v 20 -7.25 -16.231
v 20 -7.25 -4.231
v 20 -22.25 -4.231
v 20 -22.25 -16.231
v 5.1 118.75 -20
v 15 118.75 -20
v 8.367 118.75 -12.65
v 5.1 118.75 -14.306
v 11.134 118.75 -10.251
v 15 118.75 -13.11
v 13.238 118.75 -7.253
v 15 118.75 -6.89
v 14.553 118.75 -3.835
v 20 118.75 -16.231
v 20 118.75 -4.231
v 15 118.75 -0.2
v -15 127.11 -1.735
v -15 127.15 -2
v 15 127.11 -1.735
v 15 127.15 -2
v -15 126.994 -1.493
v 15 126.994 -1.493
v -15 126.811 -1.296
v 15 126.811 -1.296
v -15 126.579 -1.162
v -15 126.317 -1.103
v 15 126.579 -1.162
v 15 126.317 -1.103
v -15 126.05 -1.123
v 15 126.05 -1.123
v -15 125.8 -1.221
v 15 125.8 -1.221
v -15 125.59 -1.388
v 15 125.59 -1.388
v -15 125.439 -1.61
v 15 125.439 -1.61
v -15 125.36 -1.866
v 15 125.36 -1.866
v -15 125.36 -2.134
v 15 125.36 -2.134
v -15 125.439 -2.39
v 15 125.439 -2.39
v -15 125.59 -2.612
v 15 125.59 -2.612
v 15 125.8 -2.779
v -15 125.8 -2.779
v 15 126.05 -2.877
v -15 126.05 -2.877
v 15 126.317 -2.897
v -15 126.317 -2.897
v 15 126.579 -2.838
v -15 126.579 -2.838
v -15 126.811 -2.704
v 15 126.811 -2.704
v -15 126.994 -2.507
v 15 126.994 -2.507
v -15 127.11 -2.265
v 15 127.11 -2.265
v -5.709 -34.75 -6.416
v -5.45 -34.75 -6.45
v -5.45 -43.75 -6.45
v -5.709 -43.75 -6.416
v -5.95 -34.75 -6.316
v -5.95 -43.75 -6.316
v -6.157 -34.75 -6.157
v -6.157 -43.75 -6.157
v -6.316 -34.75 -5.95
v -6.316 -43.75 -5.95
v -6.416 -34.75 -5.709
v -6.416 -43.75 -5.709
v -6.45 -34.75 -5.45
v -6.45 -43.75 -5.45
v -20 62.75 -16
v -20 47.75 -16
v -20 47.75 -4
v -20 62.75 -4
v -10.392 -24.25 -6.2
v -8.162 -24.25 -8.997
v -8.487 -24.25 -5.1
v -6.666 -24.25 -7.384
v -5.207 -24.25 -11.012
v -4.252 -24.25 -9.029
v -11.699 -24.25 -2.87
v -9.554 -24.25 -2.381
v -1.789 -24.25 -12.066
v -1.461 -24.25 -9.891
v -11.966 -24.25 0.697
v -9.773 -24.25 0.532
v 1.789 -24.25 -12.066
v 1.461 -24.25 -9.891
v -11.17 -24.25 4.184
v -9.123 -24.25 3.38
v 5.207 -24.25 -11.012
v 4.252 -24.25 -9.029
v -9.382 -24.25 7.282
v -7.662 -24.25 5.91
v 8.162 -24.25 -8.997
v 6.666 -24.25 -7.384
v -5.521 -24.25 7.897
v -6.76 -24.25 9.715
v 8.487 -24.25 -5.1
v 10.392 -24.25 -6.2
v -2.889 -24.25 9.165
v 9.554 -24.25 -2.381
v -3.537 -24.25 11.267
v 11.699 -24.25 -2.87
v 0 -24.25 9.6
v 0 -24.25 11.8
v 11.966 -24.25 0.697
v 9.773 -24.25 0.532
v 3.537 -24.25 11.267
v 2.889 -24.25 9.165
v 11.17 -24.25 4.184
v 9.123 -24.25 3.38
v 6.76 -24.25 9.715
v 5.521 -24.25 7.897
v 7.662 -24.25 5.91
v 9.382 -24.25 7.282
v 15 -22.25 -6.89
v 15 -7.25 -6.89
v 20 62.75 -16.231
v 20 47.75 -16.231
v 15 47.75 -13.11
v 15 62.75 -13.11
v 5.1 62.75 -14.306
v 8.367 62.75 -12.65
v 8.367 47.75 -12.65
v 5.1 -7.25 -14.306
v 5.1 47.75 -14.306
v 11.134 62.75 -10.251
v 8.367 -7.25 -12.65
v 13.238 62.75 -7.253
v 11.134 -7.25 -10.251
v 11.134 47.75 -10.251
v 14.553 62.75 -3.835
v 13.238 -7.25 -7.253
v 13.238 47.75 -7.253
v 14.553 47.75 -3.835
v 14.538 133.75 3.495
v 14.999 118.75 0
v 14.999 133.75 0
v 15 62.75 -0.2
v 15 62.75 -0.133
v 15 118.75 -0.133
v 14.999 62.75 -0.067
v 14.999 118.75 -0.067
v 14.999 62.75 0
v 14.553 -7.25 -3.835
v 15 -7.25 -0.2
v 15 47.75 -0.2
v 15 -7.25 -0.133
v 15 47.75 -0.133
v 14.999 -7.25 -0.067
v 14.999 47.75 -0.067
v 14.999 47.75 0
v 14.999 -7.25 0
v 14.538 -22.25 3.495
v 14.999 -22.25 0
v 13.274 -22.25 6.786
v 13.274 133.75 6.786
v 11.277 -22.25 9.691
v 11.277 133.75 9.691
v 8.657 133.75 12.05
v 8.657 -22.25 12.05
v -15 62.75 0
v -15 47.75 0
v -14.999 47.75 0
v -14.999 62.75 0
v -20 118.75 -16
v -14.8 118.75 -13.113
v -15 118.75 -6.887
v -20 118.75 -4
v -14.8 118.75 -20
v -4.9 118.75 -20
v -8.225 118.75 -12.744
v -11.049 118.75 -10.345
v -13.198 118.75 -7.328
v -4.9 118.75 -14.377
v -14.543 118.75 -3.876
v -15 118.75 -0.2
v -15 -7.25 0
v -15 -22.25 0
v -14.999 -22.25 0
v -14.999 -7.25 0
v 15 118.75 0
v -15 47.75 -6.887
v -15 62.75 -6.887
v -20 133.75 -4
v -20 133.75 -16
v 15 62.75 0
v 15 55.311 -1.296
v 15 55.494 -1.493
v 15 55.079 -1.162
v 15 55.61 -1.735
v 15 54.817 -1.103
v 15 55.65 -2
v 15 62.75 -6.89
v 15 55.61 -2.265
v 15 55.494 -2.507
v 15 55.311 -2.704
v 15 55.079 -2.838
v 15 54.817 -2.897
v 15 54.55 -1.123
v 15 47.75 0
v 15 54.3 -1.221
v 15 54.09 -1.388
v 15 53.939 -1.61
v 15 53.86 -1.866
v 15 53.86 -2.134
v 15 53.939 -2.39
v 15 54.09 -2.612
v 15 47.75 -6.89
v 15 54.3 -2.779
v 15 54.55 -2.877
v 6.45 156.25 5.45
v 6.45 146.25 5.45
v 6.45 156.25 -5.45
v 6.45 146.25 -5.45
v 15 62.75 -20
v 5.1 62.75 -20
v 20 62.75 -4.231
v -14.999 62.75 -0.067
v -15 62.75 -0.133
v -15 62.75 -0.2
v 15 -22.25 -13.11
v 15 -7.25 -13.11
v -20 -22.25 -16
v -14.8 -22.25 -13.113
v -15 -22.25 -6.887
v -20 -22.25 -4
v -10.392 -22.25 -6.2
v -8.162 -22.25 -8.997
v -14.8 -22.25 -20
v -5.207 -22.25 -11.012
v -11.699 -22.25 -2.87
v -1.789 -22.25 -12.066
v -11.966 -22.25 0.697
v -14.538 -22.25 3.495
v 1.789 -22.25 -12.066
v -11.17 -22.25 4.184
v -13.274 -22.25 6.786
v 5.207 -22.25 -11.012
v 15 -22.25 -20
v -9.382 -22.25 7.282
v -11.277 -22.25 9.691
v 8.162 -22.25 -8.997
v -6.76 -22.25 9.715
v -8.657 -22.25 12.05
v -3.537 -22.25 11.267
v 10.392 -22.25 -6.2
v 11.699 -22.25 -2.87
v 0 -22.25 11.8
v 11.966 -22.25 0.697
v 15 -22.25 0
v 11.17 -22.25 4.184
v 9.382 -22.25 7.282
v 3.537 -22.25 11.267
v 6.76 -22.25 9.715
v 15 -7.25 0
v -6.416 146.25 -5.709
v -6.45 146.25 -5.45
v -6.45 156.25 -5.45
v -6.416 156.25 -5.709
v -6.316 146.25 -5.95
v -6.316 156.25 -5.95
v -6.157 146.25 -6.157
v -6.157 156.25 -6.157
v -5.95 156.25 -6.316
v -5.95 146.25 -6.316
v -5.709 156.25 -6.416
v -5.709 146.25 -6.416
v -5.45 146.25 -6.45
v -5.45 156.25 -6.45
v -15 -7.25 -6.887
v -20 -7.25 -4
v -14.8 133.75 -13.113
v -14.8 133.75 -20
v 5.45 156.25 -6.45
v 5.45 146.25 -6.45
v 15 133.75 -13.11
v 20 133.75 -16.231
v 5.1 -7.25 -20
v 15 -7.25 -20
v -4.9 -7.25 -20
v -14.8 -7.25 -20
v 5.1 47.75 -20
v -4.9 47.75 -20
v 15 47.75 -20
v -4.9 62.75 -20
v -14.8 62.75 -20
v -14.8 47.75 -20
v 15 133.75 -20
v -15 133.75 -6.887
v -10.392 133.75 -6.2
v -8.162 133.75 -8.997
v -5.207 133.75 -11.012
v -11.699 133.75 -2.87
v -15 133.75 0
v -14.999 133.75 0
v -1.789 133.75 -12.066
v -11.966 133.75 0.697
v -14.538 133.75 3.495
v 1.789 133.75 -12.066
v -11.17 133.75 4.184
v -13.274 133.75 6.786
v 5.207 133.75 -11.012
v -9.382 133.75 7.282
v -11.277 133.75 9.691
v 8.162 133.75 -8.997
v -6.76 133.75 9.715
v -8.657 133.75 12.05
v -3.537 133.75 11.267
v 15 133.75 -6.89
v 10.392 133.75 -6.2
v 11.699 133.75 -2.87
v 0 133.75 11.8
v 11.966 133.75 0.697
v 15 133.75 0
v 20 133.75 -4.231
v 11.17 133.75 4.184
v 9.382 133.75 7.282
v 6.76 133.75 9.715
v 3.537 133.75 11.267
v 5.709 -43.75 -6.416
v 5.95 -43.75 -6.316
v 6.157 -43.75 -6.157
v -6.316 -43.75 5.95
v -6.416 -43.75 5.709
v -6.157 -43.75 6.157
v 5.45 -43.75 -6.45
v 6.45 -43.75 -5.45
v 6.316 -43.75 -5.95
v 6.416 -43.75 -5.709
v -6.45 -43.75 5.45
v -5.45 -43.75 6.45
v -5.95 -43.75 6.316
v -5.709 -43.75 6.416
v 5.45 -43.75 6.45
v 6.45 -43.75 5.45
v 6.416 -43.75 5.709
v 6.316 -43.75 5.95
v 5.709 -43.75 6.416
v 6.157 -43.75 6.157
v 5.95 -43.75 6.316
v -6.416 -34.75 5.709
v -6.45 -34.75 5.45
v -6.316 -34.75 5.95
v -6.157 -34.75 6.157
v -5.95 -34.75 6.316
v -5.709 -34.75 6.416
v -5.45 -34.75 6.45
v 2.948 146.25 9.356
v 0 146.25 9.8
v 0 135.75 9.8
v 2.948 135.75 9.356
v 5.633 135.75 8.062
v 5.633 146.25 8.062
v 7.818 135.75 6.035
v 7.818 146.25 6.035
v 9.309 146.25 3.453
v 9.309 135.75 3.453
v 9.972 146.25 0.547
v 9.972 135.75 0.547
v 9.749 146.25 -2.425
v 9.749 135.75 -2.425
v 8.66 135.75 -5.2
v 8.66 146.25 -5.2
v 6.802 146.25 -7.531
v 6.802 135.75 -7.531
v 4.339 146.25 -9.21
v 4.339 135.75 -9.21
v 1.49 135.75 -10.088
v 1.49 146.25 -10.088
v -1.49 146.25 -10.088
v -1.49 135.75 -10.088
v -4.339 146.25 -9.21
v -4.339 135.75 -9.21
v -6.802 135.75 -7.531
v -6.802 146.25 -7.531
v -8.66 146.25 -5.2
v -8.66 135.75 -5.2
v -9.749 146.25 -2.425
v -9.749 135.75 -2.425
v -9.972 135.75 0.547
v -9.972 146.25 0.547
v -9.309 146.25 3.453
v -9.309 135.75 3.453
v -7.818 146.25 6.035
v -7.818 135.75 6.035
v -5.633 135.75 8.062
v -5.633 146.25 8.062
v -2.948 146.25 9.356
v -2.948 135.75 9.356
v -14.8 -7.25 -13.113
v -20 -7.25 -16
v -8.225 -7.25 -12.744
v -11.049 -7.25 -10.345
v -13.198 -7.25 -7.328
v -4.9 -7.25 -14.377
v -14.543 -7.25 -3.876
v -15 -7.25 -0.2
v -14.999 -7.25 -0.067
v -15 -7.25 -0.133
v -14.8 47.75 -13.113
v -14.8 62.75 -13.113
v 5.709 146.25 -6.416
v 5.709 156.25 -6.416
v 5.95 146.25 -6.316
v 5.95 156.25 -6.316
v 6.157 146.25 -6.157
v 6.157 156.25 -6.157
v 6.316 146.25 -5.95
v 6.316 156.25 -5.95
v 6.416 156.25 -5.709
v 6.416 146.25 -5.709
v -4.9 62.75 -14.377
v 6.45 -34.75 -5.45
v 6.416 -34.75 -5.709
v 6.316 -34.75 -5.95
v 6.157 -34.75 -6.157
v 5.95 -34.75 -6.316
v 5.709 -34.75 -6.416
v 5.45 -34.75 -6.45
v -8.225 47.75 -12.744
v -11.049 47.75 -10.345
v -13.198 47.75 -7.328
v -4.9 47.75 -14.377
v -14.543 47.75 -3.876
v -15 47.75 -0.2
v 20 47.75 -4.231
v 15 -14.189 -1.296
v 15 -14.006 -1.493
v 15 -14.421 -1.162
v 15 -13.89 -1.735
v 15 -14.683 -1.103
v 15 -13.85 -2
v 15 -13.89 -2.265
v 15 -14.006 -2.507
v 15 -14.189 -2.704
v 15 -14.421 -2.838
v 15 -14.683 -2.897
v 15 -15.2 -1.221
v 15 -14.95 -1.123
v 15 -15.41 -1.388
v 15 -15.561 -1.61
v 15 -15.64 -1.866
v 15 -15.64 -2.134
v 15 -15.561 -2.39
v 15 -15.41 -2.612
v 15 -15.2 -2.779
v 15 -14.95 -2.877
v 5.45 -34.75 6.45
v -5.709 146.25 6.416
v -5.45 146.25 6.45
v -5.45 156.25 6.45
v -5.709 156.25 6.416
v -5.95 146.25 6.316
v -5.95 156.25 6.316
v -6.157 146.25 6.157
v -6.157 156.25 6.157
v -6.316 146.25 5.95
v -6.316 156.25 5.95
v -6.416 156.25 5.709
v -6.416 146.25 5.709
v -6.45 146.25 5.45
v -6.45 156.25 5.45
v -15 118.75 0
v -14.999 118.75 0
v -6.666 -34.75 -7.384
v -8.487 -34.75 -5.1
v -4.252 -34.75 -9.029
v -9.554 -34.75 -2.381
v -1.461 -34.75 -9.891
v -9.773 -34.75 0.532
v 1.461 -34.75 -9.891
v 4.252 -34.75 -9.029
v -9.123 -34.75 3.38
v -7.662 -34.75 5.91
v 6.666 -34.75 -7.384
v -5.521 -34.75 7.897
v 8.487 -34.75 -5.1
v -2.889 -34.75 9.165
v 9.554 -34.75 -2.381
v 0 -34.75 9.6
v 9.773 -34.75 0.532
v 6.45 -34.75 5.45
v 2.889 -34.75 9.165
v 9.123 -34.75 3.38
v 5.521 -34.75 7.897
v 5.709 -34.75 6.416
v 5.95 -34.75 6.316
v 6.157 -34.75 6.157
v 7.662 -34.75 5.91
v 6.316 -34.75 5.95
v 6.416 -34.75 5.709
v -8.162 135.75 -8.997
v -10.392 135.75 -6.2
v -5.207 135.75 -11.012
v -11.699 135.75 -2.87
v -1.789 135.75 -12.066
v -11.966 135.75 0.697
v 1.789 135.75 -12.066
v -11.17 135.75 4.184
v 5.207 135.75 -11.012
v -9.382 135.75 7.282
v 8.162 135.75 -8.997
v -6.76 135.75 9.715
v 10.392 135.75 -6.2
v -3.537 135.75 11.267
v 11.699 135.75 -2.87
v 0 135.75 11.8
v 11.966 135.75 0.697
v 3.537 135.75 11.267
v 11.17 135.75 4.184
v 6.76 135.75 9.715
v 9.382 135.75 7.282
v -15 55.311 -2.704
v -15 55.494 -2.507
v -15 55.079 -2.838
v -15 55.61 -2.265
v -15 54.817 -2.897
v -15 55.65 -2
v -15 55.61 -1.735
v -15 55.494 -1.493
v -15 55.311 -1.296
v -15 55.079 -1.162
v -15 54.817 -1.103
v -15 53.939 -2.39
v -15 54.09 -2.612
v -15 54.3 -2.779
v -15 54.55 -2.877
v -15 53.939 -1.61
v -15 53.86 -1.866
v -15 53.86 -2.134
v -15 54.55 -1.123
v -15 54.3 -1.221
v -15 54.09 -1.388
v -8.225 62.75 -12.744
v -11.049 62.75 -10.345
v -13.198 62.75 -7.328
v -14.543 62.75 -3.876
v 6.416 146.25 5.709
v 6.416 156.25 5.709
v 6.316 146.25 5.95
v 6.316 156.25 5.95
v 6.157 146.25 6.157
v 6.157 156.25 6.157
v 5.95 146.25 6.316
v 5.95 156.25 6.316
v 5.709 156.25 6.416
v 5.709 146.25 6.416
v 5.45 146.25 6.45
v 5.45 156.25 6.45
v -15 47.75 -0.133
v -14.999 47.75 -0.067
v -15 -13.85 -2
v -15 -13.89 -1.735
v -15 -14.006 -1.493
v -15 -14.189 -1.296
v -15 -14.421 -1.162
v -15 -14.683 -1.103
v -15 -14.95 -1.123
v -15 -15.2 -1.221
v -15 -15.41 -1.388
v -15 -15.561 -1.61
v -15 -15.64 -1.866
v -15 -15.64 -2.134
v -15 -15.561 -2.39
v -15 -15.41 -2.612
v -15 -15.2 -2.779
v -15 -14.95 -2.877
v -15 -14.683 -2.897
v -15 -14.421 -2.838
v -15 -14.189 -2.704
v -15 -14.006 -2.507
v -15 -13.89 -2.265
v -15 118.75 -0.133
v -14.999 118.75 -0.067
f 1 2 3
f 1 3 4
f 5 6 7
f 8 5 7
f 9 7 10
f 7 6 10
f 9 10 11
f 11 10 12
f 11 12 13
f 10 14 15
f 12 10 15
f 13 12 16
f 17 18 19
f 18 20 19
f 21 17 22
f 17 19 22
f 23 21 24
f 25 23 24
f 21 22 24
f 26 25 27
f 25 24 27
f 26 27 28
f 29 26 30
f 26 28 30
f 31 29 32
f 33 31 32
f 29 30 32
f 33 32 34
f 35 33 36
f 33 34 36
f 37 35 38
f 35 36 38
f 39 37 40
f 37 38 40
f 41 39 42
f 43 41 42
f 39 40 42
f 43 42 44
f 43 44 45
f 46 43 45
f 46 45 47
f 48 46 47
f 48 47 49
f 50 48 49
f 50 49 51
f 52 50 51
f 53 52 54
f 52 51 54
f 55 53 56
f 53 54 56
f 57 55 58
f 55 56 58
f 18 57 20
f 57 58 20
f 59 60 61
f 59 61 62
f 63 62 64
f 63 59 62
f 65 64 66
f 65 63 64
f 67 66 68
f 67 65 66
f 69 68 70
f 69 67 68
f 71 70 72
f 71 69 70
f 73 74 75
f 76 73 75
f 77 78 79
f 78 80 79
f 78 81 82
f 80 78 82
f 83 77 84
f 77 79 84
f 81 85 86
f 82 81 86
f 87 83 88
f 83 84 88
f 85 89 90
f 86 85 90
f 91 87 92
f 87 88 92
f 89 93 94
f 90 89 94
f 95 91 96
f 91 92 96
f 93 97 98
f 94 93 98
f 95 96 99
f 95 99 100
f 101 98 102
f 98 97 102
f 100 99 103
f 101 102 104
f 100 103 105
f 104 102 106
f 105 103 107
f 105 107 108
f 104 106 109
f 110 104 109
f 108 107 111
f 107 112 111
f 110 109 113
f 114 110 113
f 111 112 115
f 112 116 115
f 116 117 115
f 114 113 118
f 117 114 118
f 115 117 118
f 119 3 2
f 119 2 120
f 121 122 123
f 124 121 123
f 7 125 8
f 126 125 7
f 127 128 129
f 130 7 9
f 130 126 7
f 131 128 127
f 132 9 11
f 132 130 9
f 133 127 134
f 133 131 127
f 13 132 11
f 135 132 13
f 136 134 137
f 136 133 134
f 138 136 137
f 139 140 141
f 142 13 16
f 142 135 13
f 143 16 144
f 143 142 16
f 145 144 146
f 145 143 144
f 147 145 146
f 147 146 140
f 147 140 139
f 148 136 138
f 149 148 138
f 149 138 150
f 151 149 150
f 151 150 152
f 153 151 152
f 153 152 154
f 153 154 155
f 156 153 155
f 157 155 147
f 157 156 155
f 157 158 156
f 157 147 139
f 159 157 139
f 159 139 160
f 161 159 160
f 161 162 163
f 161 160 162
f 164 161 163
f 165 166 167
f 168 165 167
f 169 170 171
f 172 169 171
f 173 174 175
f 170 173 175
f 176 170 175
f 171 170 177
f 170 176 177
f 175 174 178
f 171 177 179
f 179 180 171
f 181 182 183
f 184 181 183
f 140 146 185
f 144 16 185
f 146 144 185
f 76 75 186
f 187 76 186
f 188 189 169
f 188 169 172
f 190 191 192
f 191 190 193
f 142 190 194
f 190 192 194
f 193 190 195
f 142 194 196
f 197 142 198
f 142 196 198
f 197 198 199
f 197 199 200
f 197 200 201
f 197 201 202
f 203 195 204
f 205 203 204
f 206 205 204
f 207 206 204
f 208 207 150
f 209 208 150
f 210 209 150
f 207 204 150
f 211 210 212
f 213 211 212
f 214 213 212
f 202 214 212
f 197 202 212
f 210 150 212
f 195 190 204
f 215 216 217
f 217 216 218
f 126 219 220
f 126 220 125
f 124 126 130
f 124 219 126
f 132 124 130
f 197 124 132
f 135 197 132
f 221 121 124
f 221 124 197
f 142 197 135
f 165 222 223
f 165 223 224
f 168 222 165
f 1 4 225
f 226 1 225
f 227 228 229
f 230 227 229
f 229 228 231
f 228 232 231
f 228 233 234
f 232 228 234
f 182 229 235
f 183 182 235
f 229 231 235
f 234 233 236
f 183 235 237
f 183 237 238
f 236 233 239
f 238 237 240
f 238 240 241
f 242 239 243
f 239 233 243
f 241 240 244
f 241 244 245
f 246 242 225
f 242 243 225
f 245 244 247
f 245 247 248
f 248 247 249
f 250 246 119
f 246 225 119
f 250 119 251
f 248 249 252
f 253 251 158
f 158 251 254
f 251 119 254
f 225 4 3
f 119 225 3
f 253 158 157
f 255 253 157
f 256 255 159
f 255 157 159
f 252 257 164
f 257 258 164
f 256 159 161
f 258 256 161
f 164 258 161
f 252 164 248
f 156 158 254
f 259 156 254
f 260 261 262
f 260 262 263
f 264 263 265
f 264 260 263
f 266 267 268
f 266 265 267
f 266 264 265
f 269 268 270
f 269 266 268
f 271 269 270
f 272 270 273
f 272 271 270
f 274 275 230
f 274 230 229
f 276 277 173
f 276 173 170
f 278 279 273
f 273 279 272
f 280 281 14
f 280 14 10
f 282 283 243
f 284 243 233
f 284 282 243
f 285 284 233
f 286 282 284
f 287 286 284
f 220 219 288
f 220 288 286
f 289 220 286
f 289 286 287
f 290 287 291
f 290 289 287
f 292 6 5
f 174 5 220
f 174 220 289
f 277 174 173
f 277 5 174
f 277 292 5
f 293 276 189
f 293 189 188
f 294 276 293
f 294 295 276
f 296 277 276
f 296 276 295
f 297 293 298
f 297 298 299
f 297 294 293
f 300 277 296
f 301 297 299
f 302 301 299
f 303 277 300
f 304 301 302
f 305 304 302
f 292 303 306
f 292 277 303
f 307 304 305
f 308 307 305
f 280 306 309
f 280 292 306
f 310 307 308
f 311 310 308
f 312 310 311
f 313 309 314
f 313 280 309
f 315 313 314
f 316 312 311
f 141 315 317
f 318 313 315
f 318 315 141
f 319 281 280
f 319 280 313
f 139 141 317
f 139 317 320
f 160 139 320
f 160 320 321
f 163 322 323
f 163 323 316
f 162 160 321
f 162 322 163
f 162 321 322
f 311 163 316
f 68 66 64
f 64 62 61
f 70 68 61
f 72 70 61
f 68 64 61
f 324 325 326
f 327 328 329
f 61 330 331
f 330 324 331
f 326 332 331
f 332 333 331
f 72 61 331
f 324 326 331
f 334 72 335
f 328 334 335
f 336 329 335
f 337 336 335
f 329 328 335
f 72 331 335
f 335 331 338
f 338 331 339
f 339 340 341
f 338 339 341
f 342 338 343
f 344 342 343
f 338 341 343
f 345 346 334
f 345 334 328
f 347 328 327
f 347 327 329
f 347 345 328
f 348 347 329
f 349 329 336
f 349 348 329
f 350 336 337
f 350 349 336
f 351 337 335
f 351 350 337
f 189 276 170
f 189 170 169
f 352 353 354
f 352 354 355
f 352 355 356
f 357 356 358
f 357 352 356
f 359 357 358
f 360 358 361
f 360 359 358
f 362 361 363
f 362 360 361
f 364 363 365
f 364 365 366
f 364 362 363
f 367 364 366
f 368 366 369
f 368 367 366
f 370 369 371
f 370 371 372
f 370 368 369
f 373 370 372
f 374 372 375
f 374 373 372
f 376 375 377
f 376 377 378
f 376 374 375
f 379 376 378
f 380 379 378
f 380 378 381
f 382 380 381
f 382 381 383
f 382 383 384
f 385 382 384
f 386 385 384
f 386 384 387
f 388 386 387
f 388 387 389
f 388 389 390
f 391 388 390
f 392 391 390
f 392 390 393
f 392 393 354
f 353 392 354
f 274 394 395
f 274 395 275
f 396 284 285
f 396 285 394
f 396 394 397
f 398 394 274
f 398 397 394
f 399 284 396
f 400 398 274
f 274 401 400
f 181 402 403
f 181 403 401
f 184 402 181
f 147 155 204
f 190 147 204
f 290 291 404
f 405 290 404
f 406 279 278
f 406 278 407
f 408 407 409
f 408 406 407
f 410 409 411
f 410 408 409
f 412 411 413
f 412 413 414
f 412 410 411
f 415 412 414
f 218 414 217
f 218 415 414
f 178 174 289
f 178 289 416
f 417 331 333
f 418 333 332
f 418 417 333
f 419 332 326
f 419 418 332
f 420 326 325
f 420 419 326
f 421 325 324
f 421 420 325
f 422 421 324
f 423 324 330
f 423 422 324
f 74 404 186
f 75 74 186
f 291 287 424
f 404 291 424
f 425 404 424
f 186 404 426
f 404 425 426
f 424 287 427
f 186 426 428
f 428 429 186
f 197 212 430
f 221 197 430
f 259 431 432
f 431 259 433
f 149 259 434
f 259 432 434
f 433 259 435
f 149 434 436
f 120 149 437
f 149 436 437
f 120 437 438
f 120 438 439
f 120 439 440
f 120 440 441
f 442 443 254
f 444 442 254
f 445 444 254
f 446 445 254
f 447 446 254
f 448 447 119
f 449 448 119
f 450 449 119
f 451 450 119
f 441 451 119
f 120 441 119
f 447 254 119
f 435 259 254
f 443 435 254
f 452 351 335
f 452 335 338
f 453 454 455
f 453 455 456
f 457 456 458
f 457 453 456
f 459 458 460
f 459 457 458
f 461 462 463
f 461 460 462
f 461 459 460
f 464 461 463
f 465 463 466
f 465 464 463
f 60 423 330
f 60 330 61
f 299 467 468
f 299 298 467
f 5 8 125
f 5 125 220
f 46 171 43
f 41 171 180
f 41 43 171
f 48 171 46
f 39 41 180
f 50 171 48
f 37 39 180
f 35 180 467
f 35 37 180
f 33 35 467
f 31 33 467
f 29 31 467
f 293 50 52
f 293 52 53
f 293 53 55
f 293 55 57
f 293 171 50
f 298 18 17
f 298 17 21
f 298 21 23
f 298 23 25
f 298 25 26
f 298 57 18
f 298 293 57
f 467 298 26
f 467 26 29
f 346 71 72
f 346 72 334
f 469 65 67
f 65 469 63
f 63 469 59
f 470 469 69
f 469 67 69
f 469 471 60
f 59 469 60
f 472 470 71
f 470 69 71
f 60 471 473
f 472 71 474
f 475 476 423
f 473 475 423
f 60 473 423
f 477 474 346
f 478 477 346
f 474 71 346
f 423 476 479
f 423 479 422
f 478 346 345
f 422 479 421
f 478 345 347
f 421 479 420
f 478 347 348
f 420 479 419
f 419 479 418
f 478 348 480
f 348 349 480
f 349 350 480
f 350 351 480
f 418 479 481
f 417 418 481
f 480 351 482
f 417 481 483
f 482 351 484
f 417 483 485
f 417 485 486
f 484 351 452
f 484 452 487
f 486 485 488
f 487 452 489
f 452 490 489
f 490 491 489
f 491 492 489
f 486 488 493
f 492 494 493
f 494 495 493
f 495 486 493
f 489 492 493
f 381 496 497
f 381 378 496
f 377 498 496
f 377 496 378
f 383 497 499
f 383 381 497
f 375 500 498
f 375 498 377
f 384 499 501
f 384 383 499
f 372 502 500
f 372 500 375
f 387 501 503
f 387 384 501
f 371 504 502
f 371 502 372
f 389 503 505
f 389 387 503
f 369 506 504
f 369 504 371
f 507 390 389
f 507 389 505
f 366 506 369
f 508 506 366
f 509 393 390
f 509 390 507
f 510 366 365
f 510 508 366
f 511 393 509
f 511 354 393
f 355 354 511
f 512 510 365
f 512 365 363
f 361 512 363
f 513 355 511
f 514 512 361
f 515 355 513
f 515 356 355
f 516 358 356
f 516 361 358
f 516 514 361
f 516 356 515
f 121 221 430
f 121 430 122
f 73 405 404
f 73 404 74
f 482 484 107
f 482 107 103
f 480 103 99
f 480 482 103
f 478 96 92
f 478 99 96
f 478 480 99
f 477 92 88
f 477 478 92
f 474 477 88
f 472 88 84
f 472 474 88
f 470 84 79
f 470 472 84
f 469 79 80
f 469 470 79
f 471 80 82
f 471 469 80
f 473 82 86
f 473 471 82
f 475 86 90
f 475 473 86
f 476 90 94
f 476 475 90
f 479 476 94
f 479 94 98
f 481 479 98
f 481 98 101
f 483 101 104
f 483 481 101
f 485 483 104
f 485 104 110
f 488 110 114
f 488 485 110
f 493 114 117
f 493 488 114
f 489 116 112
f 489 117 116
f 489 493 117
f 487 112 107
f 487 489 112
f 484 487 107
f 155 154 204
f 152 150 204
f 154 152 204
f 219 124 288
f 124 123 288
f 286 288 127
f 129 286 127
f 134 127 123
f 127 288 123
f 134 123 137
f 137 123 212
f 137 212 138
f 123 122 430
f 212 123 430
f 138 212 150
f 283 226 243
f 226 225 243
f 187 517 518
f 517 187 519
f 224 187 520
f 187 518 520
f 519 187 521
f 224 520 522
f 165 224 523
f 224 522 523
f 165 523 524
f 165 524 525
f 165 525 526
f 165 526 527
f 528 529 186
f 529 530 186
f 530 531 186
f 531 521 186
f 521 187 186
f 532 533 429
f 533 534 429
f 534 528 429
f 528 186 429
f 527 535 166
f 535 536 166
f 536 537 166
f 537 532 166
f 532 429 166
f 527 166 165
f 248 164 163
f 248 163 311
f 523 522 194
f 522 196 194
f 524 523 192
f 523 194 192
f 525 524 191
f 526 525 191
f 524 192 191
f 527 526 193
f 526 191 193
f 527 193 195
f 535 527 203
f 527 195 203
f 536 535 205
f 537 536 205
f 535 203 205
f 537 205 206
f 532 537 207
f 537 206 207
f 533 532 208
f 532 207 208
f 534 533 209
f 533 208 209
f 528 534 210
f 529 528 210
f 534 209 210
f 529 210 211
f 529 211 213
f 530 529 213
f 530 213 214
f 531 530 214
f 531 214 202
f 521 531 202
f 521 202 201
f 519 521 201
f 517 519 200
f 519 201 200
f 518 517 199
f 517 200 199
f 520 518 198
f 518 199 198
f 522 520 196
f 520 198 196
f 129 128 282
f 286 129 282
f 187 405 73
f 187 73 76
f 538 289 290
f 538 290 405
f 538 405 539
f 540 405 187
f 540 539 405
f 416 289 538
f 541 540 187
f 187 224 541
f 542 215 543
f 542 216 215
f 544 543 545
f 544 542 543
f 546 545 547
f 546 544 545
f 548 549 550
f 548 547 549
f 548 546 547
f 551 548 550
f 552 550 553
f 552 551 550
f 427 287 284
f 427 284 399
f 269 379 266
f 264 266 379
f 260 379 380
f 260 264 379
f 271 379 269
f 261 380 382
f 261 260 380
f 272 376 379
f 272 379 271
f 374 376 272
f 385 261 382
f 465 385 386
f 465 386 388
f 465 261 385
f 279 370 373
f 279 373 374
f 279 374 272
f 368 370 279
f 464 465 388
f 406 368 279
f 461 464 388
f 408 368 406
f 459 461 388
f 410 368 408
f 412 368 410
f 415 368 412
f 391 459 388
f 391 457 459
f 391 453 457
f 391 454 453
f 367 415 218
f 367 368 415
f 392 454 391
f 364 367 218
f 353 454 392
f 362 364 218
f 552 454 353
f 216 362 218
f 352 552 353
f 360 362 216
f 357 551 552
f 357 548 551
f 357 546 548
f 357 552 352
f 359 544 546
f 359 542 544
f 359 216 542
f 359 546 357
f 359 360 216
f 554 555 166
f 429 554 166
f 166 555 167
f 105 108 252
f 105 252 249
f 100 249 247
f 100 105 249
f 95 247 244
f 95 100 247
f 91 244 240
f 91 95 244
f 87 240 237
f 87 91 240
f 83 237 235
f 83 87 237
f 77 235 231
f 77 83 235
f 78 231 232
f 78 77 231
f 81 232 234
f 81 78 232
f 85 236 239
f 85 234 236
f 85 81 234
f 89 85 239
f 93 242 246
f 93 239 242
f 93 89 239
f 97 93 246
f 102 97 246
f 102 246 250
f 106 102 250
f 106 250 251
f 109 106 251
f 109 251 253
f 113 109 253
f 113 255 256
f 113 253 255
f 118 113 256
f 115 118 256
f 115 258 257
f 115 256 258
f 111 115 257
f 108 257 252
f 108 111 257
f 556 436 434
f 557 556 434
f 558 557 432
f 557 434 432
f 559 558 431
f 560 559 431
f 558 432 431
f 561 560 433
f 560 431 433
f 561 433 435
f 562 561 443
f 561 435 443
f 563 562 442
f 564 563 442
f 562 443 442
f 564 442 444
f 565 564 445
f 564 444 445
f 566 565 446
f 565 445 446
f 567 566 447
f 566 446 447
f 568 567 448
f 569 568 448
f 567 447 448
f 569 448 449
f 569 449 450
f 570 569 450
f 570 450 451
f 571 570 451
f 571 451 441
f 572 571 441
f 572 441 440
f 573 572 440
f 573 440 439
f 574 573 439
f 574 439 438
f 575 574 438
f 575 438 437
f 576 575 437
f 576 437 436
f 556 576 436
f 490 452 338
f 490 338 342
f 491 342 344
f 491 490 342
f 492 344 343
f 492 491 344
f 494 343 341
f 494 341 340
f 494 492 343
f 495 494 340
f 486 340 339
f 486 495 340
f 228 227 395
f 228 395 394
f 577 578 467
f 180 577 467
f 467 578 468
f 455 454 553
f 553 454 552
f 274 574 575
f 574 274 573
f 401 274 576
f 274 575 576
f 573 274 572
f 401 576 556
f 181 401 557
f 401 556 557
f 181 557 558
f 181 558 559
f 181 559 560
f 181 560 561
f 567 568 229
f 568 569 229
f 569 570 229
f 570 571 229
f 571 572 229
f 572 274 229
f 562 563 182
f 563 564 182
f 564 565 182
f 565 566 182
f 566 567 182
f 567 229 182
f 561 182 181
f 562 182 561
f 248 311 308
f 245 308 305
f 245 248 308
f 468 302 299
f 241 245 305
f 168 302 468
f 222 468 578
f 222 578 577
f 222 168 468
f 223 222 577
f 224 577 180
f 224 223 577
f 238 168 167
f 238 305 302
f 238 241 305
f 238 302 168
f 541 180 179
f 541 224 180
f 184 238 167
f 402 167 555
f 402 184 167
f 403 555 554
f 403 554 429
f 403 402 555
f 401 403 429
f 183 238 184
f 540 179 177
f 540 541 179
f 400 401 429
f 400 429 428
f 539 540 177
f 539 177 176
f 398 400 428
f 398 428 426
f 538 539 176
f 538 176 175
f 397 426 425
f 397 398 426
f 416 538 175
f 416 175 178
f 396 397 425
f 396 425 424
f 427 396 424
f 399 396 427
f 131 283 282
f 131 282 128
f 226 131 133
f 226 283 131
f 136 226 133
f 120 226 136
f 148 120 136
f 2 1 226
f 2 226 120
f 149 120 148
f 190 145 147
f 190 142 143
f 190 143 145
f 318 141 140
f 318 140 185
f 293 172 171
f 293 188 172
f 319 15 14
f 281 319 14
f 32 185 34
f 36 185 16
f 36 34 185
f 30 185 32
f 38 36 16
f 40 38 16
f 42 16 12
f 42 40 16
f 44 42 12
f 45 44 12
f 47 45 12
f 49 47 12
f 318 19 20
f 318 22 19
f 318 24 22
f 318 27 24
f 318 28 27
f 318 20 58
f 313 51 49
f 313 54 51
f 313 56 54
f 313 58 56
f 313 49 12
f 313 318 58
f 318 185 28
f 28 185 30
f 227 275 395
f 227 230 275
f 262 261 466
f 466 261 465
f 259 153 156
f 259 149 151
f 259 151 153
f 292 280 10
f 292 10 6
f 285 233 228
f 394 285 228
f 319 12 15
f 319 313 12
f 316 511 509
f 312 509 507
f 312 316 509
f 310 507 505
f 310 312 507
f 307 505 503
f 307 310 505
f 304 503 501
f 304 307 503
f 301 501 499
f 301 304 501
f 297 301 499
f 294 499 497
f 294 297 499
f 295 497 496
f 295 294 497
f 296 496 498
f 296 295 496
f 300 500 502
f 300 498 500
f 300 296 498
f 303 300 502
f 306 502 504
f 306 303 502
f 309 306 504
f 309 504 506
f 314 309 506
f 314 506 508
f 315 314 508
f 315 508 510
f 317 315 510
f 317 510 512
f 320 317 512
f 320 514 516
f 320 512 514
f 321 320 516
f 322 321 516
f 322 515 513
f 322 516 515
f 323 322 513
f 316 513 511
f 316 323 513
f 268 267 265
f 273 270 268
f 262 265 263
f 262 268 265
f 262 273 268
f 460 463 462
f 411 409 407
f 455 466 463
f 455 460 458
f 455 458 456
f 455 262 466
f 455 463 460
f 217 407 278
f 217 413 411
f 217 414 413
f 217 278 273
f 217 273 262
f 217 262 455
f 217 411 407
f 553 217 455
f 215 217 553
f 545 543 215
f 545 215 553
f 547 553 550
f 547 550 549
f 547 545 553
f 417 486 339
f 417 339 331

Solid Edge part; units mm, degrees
sketch "Sketch1" plane through (0, 0, 0) normal (1, 0, 0) x (0, 1, 0)
  line L0 (133.75, 14.8) -> (-22.25, 14.8)
  line L1 (-22.25, 14.8) -> (-22.25, 11.8)
  line L2 (-22.25, 11.8) -> (-24.25, 11.8)
  line L3 (-24.25, 11.8) -> (-24.25, 9.6)
  line L4 (-24.25, 9.6) -> (-34.75, 9.6)
  line L5 (-34.75, 9.6) -> (-34.75, -0.2)
  line L6 (-34.75, -0.2) -> (-24.25, -0.2)
  line L7 (-24.25, -0.2) -> (146.25, -0.2)
  line L8 (146.25, 9.8) -> (146.25, -0.2)
  line L9 (135.75, 9.8) -> (146.25, 9.8)
  line L10 (135.75, 9.8) -> (135.75, 11.8)
  line L11 (135.75, 11.8) -> (133.75, 11.8)
  line L12 (133.75, 11.8) -> (133.75, 14.8)
revolve "RevolvedProtrusion1" add sketch "Sketch1" angle 360 about axis through (0, -24.25, -0.2) along (0, 1, 0)
sketch "Sketch2" plane through (0, -22.25, 0) normal (0, -1, 0) x (1, 0, 0)
  line L0 (20, -4.2309) -> (20, -16.2309)
  line L1 (20, -16.2309) -> (15, -13.11)
  line L2 (15, -13.11) -> (15, -20)
  line L3 (15, -20) -> (-14.8, -20)
  line L4 (-14.8, -20) -> (-14.8, -13.1132)
  line L5 (-20, -16) -> (-14.8, -13.1132)
  line L6 (-20, -4) -> (-20, -16)
  line L7 (-20, -4) -> (-15, -6.8868)
  line L8 (-15, -6.8868) -> (-15, 0)
  line L9 (-15, 0) -> (15, 0)
  line L10 (15, 0) -> (15, -6.89)
  line L11 (20, -4.2309) -> (15, -6.89)
extrude "Protrusion1" add sketch "Sketch2" against normal blind 15
extrude "Protrusion2" [suppressed]
sketch "Sketch3" plane through (0, 146.25, -0.2) normal (0, 1, 0) x (-1, 0, 0)
  line L0 (6.45, -5.25) -> (6.45, 5.65)
  arc A0 (6.45, 5.65) -> (5.45, 6.65) centre (5.45, 5.65) ccw
  line L1 (5.45, 6.65) -> (-5.45, 6.65)
  arc A1 (-5.45, 6.65) -> (-6.45, 5.65) centre (-5.45, 5.65) ccw
  line L2 (-6.45, 5.65) -> (-6.45, -5.25)
  arc A2 (-5.45, -6.25) -> (-6.45, -5.25) centre (-5.45, -5.25) cw
  line L3 (-5.45, -6.25) -> (5.45, -6.25)
  arc A3 (5.45, -6.25) -> (6.45, -5.25) centre (5.45, -5.25) ccw
extrude "Anschluss1" add sketch "Sketch3" along normal blind 10
sketch "Sketch4" plane through (0, 146.25, -0.2) normal (0, 1, 0) x (-1, 0, 0)
  line L0 (6.45, -5.25) -> (6.45, 5.65)
  arc A0 (6.45, 5.65) -> (5.45, 6.65) centre (5.45, 5.65) ccw
  line L1 (5.45, 6.65) -> (-5.45, 6.65)
  arc A1 (-5.45, 6.65) -> (-6.45, 5.65) centre (-5.45, 5.65) ccw
  line L2 (-6.45, 5.65) -> (-6.45, -5.25)
  arc A2 (-5.45, -6.25) -> (-6.45, -5.25) centre (-5.45, -5.25) cw
  line L3 (-5.45, -6.25) -> (5.45, -6.25)
  arc A3 (5.45, -6.25) -> (6.45, -5.25) centre (5.45, -5.25) ccw
extrude "ExtrudedProtrusion_8" add sketch "Sketch4" against normal blind 190
extrude "Cutout1" [suppressed]
sketch "Sketch5" plane through (15, 55.75, -3.445) normal (1, 0, 0) x (0, 1, 0)
  circle A0 centre (-70.5, 1.445) radius 0.9
extrude "ExtrudedCutout_5" cut sketch "Sketch5" against normal blind 30
sketch "Sketch6" plane through (15, 55.75, -3.445) normal (1, 0, 0) x (0, 1, 0)
  circle A0 centre (70.5, 1.445) radius 0.9
extrude "ExtrudedCutout_6" cut sketch "Sketch6" against normal blind 30
sketch "Sketch7" plane through (15, 55.75, -3.445) normal (1, 0, 0) x (0, 1, 0)
  circle A0 centre (-1, 1.445) radius 0.9
extrude "ExtrudedCutout_7" cut sketch "Sketch7" against normal blind 30
sketch "Sketch8" plane through (0, 133.75, -0.2) normal (0, 1, 0) x (-1, 0, 0)
  line L0 (-20, -4.0309) -> (-20, -16.0309)
  line L1 (-20, -16.0309) -> (-15, -12.91)
  line L2 (-15, -12.91) -> (-15, -19.8)
  line L3 (-15, -19.8) -> (14.8, -19.8)
  line L4 (14.8, -19.8) -> (14.8, -12.9132)
  line L5 (14.8, -12.9132) -> (20, -15.8)
  line L6 (20, -15.8) -> (20, -3.8)
  line L7 (20, -3.8) -> (15, -6.6868)
  line L8 (15, -6.6868) -> (15, 0.2)
  line L9 (15, 0.2) -> (-15, 0.2)
  line L10 (-15, 0.2) -> (-15, -6.69)
  line L11 (-15, -6.69) -> (-20, -4.0309)
extrude "ExtrudedProtrusion_9" add sketch "Sketch8" against normal blind 15
sketch "Sketch9" plane through (15, 55.75, -3.445) normal (1, 0, 0) x (0, 1, 0)
  circle A0 centre (70.5, 1.445) radius 0.9
extrude "ExtrudedCutout_8" cut sketch "Sketch9" against normal blind 30
sketch "Sketch10" plane through (0, 133.75, -0.2) normal (0, 1, 0) x (-1, 0, 0)
  line L0 (-5.1, -10.1993) -> (-5.1, -19.8)
  line L1 (-5.1, -19.8) -> (4.9, -19.8)
  line L2 (4.9, -19.8) -> (4.9, -10.1993)
  line L3 (4.9, -10.1993) -> (-5.1, -10.1993)
extrude "ExtrudedProtrusion_10" add sketch "Sketch10" against normal blind 156
sketch "Sketch11" plane through (0, 133.75, -0.2) normal (0, 1, 0) x (-1, 0, 0)
  line L0 (-10, 17.75) -> (-10, 12.25)
  line L1 (-10, 12.25) -> (10, 12.25)
  line L2 (10, 12.25) -> (10, 17.75)
  line L3 (10, 17.75) -> (-10, 17.75)
extrude "ExtrudedCutout_9" cut sketch "Sketch11" against normal blind 156
sketch "Sketch12" plane through (-12.45, 47.75, -10.1) normal (0, 1, 0) x (-1, 0, 0)
  line L0 (7.55, -5.9) -> (7.55, 6.1)
  line L1 (7.55, 6.1) -> (2.55, 3.2132)
  line L2 (2.55, 3.2132) -> (2.55, 10.1)
  line L3 (2.55, 10.1) -> (-27.45, 10.1)
  line L4 (-27.45, 10.1) -> (-27.45, 3.21)
  line L5 (-27.45, 3.21) -> (-32.45, 5.8691)
  line L6 (-32.45, 5.8691) -> (-32.45, -6.1309)
  line L7 (-32.45, -6.1309) -> (-27.45, -3.01)
  line L8 (-27.45, -3.01) -> (-27.45, -9.9)
  line L9 (-27.45, -9.9) -> (2.35, -9.9)
  line L10 (2.35, -9.9) -> (2.35, -3.0132)
  line L11 (2.35, -3.0132) -> (7.55, -5.9)
extrude "ExtrudedProtrusion_11" add sketch "Sketch12" along normal blind 15
sketch "Sketch13" plane through (15, 55.75, -3.445) normal (1, 0, 0) x (0, 1, 0)
  circle A0 centre (-1, 1.445) radius 0.9
extrude "ExtrudedCutout_10" cut sketch "Sketch13" against normal blind 30
